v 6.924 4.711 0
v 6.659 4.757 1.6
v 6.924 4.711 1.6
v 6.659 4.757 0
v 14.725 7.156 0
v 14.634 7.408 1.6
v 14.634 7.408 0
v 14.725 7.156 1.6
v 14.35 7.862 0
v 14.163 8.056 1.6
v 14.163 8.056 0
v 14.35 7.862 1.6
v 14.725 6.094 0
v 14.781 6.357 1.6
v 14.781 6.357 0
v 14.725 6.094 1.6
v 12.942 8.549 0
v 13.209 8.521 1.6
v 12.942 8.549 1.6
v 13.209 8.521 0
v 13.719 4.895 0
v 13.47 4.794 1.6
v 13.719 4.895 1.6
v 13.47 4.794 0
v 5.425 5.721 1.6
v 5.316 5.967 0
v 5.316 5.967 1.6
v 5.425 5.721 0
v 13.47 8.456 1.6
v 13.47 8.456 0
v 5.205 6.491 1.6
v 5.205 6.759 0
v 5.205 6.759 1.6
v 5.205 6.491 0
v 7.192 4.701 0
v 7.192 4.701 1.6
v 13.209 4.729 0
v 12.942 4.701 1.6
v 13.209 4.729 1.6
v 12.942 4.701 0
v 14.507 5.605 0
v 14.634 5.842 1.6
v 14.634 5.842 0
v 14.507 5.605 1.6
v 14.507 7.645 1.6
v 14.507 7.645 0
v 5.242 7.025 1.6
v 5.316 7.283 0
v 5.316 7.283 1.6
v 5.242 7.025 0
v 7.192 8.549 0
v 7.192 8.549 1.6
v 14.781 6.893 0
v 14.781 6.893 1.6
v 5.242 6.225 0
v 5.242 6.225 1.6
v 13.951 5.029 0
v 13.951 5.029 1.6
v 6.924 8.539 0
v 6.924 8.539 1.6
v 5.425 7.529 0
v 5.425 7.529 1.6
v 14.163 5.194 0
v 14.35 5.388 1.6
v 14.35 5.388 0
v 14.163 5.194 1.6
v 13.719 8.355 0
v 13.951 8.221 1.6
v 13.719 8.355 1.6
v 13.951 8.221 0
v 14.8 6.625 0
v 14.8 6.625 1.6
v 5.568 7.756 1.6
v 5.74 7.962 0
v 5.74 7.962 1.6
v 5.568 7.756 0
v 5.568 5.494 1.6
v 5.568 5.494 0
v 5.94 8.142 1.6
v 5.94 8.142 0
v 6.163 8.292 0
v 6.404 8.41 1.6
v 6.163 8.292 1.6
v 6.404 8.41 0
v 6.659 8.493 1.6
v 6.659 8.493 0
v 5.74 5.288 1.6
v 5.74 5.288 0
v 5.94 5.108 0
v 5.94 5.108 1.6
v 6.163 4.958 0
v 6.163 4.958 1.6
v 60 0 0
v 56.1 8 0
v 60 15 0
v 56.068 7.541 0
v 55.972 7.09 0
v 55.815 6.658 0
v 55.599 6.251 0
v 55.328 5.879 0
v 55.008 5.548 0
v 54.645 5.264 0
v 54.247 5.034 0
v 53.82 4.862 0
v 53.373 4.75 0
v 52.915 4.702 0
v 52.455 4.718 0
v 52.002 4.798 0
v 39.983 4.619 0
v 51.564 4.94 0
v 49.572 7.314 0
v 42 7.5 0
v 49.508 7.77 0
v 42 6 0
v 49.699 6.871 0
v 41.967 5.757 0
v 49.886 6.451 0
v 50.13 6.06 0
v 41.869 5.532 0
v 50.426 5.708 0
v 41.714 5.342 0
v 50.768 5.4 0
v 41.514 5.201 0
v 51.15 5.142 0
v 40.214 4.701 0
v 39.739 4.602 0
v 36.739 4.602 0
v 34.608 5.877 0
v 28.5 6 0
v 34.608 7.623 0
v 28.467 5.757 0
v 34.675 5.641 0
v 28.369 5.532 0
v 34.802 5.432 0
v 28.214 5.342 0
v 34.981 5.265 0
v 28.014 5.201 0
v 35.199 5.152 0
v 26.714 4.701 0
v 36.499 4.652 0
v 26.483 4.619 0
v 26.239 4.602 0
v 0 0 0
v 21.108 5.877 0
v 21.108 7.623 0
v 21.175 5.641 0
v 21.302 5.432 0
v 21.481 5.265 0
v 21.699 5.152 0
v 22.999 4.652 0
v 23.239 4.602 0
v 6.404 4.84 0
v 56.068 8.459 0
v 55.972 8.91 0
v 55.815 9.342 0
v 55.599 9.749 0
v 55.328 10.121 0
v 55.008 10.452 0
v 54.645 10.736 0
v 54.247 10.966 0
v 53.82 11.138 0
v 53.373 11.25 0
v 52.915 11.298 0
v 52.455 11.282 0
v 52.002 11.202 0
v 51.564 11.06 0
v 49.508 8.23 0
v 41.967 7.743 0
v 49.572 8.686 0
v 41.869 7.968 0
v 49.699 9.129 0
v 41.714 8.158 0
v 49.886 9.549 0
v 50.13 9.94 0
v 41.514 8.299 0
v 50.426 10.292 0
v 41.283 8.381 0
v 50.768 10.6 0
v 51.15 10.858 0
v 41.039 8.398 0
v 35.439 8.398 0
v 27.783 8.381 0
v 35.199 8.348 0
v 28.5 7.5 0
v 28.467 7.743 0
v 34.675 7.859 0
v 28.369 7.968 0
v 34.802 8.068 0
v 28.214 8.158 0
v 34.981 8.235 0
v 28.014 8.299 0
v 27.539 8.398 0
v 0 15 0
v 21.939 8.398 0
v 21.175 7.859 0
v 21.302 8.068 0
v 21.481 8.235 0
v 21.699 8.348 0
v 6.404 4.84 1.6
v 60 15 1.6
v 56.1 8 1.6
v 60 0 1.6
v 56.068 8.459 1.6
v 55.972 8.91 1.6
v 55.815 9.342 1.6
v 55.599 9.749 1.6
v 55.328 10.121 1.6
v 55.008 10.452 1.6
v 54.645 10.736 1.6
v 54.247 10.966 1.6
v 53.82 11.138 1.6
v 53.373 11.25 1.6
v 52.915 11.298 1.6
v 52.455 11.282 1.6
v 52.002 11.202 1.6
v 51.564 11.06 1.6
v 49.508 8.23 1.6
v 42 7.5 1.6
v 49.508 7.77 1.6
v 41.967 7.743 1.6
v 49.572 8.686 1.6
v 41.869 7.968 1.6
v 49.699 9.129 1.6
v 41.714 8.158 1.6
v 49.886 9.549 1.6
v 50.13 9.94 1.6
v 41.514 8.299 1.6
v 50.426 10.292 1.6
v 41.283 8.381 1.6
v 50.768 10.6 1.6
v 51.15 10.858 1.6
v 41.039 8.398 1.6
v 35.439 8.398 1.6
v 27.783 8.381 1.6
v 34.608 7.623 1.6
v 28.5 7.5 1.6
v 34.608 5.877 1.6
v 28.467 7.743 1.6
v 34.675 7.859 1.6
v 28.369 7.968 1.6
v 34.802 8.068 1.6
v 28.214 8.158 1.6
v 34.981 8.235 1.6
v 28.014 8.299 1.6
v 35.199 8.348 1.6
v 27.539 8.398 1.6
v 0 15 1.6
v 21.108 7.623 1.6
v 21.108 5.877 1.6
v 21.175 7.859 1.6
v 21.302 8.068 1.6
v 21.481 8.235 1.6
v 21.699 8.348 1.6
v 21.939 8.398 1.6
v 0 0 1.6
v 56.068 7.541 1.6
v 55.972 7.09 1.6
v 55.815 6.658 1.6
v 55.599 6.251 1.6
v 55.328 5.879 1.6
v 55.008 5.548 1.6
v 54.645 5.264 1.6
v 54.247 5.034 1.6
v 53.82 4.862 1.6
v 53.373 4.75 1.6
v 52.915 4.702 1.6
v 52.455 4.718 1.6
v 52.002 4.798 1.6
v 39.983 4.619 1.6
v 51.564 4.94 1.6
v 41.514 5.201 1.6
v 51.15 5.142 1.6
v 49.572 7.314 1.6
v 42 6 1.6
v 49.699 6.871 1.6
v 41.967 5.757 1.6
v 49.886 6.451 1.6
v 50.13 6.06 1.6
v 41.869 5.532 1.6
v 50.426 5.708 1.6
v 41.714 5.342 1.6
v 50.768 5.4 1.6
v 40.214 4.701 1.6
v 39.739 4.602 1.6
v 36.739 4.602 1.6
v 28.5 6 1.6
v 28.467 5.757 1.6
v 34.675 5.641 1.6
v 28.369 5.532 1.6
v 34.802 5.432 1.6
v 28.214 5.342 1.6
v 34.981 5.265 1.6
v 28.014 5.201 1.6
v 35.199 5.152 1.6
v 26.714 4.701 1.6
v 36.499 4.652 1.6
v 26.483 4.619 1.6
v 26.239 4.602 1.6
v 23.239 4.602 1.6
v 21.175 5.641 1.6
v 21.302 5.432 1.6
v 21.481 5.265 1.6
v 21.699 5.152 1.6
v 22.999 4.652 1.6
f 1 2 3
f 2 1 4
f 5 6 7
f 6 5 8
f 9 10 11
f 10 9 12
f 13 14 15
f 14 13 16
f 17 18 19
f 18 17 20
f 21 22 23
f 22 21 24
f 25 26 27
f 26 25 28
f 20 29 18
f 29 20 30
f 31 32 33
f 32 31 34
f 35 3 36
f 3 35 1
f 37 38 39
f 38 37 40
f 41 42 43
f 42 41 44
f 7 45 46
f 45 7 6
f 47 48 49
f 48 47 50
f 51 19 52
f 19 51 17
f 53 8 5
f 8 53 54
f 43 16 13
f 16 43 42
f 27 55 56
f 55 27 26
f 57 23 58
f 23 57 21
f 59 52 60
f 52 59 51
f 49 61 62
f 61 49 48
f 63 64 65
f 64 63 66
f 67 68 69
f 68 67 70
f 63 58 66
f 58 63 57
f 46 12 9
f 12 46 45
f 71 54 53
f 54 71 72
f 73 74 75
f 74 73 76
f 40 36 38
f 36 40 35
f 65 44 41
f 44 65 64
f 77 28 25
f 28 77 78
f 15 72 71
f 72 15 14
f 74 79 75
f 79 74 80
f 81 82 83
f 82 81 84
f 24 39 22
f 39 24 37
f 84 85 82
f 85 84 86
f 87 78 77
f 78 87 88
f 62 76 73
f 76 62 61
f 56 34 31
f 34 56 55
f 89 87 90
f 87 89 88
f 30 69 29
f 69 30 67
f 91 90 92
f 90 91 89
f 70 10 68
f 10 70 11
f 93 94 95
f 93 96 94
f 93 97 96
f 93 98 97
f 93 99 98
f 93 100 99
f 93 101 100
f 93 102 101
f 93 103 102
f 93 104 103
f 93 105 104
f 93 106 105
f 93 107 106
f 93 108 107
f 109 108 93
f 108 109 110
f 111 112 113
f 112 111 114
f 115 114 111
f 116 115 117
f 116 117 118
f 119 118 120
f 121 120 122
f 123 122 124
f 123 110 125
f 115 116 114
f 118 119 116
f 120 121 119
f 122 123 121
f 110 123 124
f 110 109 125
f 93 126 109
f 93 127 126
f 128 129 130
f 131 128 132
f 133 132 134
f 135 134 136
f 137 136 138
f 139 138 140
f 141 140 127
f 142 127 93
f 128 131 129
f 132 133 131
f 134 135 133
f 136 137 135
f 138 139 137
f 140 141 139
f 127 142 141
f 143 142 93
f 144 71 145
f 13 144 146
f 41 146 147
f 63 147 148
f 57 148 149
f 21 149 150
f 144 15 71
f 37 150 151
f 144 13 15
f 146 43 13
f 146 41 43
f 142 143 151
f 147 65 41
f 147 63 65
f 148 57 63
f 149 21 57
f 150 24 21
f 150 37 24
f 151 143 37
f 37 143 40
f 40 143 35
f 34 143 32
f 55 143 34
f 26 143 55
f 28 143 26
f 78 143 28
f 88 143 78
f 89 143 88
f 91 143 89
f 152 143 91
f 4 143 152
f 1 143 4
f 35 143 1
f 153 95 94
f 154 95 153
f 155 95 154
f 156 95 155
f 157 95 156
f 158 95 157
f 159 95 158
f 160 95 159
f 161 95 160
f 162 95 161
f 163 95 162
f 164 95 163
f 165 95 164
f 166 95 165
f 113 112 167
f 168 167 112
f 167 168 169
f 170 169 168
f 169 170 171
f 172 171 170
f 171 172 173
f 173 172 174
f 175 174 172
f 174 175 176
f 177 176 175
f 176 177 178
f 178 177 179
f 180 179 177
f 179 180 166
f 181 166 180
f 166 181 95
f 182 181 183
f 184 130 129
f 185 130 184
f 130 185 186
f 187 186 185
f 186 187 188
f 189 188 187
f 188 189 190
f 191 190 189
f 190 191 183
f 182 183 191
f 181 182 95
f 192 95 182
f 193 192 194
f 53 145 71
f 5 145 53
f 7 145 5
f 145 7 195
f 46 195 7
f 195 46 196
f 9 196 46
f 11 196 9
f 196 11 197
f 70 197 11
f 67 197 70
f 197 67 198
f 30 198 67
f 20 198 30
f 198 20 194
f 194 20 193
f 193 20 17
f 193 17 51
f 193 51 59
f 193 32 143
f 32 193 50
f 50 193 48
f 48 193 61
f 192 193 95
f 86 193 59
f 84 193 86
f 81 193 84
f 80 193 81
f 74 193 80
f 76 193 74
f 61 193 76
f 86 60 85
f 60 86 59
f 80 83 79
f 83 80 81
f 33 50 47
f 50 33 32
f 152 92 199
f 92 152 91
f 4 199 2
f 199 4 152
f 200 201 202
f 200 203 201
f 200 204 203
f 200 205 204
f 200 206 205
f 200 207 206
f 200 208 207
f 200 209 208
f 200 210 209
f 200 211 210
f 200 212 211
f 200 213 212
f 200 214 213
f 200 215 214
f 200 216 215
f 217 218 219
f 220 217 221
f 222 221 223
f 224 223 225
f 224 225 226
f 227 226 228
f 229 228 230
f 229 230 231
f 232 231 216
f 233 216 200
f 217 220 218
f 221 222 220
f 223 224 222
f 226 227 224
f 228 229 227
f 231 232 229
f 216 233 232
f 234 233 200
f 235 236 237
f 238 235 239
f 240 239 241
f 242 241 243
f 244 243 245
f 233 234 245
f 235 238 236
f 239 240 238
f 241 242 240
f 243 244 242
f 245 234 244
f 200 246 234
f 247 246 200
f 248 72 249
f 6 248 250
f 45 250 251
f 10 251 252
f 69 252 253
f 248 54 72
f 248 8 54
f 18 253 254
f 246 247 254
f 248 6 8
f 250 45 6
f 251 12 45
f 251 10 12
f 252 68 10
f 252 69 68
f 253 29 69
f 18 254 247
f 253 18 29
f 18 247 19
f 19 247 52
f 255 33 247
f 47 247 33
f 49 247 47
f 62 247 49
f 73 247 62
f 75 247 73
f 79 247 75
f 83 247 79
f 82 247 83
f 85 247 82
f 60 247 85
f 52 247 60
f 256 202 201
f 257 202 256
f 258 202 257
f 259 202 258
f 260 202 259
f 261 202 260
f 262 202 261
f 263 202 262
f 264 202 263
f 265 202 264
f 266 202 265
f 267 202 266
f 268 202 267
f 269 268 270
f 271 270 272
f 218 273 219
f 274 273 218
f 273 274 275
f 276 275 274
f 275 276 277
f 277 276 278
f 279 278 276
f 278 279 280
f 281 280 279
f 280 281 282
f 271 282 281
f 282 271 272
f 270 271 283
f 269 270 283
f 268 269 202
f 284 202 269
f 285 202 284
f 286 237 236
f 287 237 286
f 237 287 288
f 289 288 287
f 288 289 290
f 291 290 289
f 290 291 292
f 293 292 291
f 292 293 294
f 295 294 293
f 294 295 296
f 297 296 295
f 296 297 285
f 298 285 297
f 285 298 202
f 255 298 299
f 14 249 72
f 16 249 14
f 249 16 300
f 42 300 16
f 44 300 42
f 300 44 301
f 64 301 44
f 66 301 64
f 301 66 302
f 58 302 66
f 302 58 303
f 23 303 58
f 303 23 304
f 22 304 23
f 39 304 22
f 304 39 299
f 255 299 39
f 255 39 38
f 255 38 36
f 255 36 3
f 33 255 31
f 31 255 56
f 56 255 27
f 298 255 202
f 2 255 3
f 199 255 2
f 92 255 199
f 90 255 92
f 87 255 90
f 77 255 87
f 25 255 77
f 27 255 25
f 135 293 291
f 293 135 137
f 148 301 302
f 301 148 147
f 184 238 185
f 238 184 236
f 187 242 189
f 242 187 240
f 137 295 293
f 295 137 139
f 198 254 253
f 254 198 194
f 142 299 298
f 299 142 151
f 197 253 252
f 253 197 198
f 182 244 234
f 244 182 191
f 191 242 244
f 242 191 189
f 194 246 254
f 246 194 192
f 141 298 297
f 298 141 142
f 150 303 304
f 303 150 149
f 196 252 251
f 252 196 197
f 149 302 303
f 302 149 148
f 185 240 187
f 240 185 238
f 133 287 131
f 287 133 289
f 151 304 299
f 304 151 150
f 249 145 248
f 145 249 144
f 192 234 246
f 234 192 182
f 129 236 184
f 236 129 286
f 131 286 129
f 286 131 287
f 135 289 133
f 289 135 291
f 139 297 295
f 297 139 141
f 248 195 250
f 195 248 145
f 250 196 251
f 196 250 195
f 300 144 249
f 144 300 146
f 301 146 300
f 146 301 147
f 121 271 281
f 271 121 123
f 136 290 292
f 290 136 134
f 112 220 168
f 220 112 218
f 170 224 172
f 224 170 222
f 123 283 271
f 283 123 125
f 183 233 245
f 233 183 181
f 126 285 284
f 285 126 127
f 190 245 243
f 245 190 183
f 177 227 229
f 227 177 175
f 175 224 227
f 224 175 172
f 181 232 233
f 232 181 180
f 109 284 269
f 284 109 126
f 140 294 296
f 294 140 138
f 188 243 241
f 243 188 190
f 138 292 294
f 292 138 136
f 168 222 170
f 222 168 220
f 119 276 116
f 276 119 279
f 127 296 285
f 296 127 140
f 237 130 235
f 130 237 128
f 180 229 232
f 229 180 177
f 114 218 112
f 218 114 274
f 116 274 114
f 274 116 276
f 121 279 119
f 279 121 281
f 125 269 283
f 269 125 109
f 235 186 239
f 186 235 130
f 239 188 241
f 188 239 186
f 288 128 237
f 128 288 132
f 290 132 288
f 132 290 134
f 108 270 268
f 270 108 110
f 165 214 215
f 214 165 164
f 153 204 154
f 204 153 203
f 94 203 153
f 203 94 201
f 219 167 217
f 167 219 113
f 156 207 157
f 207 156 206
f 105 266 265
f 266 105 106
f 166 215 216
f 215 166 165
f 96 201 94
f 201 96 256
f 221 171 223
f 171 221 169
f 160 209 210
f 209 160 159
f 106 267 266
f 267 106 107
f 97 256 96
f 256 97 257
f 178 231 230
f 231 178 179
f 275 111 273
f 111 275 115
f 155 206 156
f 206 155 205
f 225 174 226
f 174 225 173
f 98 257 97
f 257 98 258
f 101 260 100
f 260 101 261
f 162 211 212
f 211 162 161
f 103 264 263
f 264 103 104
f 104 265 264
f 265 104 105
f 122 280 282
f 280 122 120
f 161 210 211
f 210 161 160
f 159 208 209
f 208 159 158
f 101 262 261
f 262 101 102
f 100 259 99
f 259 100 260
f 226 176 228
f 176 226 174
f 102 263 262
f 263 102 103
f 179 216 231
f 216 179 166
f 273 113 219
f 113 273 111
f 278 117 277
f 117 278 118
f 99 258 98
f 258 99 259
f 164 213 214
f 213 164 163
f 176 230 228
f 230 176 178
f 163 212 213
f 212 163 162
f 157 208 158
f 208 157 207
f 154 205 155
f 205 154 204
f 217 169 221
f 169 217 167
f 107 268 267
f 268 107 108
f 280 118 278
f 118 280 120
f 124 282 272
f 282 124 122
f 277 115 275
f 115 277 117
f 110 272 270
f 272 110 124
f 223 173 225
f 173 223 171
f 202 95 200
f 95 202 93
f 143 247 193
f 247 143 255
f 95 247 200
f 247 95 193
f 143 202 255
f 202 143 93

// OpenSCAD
// file: ports.scad
module USBC(offset, wall)
{
    radius = (3.25 / 2);

    r = radius + offset;

    width = 9;

    offcenter = width / 2 - radius;

    translate([ 0, radius, 0 ]) hull()
    {
        translate([ offcenter, 0, 0 ]) cylinder(h = wall, r = r, center = true);

        translate([ -offcenter, 0, 0 ])
            cylinder(h = wall, r = r, center = true);
    }
}

module HDMIMicro(offset, wall)
{
    // needs mor offset because of clamps
    offset = offset + 0.1;

    radius = 0.5;

    r = radius + offset;

    height1 = 3.0;

    h1 = height1 - radius * 2;

    width1 = 6.6;
    w1 = width1 / 2 - radius;

    width2 = 4;
    w2 = width2 / 2 - radius;

    translate([ 0, radius, 0 ]) hull()
    {

        translate([ w1, h1, 0 ]) cylinder(h = wall, r = r, center = true);
        translate([ -w1, h1, 0 ]) cylinder(h = wall, r = r, center = true);

        translate([ w1, h1 / 4, 0 ]) cylinder(h = wall, r = r, center = true);
        translate([ -w1, h1 / 4, 0 ]) cylinder(h = wall, r = r, center = true);

        translate([ w2, 0, 0 ]) cylinder(h = wall, r = r, center = true);
        translate([ -w2, 0, 0 ]) cylinder(h = wall, r = r, center = true);
    }
}

module Klinke(offset, wall)
{
    radius = (6 / 2);
    r = radius + offset;

    translate([ 0, radius, 0 ]) cylinder(h = wall, r = r, center = true);
}

// zero is bottom center of usb port
module Ports(wall, offset)
{
    translate([ 0, 0, wall / 2 ]) USBC(offset = offset, wall = wall);
    translate([ 14.8, 0, wall / 2 ]) HDMIMicro(offset = offset, wall = wall);
    translate([ 14.8 + 13.5, 0, wall / 2 ])
        HDMIMicro(offset = offset, wall = wall);
    translate([ 14.8 + 13.5 + 14.5, 0, wall / 2 ])
        Klinke(offset = offset, wall = wall);
}
// main file
use <ports.scad>

$fa = 8;
$fs = 0.25;

wall = 4 * 0.4;

plate = [ 60, 15 ];

difference()
{
    cube(size = [ plate[0], plate[1], wall ]);
    translate([ 10, 5, 0 ]) Ports(wall = wall, offset = 0.3);
}
